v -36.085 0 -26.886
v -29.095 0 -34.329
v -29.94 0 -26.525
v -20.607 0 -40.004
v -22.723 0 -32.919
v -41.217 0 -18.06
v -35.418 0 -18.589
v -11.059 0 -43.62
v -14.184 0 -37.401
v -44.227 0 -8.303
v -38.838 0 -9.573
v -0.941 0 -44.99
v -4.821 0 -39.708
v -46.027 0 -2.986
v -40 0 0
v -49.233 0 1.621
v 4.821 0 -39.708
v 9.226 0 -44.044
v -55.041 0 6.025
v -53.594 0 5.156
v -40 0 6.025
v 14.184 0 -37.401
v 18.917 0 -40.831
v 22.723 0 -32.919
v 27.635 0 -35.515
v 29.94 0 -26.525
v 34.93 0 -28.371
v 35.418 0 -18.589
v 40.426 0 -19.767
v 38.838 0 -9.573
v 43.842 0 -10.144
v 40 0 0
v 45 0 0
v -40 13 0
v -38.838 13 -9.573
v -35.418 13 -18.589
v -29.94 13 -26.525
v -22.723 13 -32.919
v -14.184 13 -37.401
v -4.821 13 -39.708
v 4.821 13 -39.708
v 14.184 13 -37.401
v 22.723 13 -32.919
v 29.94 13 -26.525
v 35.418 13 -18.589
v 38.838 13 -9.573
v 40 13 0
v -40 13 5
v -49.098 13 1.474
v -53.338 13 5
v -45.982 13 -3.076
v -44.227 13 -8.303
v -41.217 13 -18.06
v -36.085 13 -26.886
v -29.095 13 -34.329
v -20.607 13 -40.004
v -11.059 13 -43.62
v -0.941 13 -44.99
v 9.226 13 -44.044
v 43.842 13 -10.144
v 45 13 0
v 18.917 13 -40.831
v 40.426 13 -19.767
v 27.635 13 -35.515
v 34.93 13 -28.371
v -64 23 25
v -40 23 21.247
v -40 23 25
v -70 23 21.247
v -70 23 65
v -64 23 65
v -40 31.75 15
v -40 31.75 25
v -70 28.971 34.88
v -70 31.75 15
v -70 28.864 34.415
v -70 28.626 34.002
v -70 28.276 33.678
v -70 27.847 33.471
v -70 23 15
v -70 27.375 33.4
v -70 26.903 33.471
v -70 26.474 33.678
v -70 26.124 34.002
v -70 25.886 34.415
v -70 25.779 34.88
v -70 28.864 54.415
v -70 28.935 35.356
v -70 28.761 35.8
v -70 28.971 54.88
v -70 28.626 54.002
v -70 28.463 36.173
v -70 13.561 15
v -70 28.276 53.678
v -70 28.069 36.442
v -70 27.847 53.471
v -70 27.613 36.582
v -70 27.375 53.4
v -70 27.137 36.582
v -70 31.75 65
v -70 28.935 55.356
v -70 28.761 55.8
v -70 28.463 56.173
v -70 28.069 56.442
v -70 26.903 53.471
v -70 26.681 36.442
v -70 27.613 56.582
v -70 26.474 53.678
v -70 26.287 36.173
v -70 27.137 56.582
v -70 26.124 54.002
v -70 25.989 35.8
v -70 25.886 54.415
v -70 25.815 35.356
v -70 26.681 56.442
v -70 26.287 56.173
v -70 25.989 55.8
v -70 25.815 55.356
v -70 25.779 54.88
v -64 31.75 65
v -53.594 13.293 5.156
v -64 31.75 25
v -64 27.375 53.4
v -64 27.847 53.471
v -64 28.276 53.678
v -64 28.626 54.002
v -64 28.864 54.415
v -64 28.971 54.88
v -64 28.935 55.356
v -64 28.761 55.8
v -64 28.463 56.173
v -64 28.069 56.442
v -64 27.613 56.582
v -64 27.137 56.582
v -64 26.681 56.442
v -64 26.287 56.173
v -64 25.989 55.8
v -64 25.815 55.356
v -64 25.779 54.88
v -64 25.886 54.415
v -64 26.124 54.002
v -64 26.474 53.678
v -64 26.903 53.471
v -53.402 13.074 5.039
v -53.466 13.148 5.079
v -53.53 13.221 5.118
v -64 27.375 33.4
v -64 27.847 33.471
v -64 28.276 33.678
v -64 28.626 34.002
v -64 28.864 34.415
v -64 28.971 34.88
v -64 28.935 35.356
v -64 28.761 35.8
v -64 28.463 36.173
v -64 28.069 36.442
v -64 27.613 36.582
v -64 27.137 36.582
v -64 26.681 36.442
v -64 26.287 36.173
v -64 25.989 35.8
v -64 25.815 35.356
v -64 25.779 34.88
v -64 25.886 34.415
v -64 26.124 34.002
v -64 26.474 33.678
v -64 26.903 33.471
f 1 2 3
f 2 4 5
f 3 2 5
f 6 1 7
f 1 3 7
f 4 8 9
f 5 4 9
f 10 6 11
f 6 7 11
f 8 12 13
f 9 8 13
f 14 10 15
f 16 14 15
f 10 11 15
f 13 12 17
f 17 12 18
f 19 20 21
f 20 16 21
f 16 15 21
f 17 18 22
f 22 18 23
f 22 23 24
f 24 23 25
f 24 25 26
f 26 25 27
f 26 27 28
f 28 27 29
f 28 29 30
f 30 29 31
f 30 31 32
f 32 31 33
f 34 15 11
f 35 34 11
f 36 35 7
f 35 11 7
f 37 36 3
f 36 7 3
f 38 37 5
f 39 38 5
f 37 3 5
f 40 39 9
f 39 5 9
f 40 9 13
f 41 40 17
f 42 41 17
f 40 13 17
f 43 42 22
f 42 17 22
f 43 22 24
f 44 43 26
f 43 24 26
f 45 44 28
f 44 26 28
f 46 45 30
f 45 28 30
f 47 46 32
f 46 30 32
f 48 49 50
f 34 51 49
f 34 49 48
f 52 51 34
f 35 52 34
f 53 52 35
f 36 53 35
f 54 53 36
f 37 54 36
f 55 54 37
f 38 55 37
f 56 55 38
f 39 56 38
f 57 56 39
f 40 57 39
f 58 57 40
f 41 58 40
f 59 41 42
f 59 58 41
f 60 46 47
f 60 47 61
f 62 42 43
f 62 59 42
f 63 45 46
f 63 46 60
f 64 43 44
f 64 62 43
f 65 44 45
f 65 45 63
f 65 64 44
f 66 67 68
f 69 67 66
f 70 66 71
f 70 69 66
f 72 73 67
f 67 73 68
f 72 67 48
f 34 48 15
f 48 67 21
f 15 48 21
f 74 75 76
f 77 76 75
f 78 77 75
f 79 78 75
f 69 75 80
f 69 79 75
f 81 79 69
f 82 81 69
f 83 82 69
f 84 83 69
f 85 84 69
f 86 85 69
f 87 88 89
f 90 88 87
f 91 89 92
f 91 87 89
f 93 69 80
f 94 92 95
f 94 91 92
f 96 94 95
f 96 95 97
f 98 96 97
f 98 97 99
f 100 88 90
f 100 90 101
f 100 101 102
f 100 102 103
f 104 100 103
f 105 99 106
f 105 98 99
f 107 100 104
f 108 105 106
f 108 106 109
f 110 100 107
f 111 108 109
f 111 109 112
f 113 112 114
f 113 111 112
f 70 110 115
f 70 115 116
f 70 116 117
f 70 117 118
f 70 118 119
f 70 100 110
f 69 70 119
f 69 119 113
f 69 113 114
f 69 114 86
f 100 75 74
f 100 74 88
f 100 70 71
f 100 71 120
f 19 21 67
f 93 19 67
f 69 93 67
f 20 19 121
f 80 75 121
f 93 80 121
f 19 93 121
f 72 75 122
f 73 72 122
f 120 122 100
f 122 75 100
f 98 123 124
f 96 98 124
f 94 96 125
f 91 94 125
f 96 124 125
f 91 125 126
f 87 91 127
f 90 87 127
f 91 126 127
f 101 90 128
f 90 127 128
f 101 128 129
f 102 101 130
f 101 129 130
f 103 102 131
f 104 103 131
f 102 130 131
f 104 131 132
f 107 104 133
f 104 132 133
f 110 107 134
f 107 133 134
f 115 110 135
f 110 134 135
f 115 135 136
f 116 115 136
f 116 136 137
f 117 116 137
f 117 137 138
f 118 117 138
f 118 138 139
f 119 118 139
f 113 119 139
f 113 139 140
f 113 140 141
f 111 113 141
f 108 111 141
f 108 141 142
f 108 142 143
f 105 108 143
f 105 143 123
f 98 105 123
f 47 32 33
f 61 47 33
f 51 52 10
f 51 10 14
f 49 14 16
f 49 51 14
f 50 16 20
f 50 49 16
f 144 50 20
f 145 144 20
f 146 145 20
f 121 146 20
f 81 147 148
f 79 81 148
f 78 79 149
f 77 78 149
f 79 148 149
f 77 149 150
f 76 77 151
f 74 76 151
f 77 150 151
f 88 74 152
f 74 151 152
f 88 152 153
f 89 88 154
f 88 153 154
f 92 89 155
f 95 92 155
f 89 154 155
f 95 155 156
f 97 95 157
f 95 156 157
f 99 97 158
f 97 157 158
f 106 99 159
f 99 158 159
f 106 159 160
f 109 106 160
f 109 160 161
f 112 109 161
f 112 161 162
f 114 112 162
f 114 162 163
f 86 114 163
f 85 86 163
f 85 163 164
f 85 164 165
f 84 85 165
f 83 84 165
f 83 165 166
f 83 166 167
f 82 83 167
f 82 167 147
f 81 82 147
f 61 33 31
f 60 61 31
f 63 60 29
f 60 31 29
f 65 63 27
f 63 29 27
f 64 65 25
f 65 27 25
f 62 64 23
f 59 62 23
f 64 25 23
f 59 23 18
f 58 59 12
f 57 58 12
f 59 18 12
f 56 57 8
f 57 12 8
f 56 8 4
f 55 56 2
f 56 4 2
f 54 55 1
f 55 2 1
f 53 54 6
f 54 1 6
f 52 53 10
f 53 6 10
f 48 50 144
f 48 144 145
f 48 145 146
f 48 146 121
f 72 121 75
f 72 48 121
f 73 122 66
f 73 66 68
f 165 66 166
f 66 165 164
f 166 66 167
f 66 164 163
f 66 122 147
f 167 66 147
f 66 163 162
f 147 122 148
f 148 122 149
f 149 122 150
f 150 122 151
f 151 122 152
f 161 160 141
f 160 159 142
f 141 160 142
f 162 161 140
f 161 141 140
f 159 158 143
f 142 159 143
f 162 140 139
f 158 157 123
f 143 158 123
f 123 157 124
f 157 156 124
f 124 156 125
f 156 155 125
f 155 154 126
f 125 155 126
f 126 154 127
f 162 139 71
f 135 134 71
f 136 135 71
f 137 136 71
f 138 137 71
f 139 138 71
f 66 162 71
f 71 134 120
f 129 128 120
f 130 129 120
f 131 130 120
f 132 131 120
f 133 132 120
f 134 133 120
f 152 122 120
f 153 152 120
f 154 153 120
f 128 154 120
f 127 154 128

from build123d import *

# Parameters (mm, degrees)
EXTRUDE_1_DEPTH          = 13
SKETCH_2_W               = 30
SKETCH_2_H               = 13
EXTRUDE_2_DEPTH          = 5
EXTRUDE_3_DEPTH          = 30
SKETCH_4_W               = 30
SKETCH_4_H               = 8.75
EXTRUDE_4_DEPTH          = 10
CUT_EXTRUDE_3_DEPTH      = 86.302769592
CUT_EXTRUDE_3_DEPTH_BACK = 86.302769592
SKETCH_9_W               = 40
SKETCH_9_H               = 8.75
EXTRUDE_5_DEPTH          = 6
SKETCH_10_R              = 1.6
CUT_EXTRUDE_4_DEPTH      = 131.820726569
PATTERN_LINEAR_1_COUNT   = 2
PATTERN_LINEAR_1_PITCH   = 20
CHAMFER_3_SIZE           = 30
CHAMFER_3_SIZE_2         = 6.247089083
FILLET_1_R               = 20


with BuildPart() as part:
    # 草圖1 → 填料-伸長1 (new body)
    with BuildSketch(Plane(origin=(0, 0, 0), x_dir=(1, 0, 0), z_dir=(0, 1, 0))):
        with BuildLine():
            Line((-45, 0), (-40, 0))
            ThreePointArc((-40, 0), (0, 40), (40, 0))
            Line((40, 0), (45, 0))
            ThreePointArc((45, 0), (0, 45), (-45, 0))
        make_face()
    extrude(amount=EXTRUDE_1_DEPTH)

    # 草圖2 → 填料-伸長2 (add)
    with BuildSketch(Plane.XY):
        with Locations((-55, 6.5)):
            Rectangle(SKETCH_2_W, SKETCH_2_H)
    extrude(amount=EXTRUDE_2_DEPTH)

    # 草圖3 → 填料-伸長3 (add)
    with BuildSketch(Plane(origin=(-40, 0, 0), x_dir=(0, 0, -1), z_dir=(1, 0, 0))):
        Polygon((-5, 0), (-5, 13), (-15, 31.75), (-15, 23), align=None)
    extrude(amount=-EXTRUDE_3_DEPTH)

    # 草圖4 → 填料-伸長4 (add)
    with BuildSketch(Plane.XY.offset(15)):
        with Locations((-55, 27.375)):
            Rectangle(SKETCH_4_W, SKETCH_4_H)
    extrude(amount=EXTRUDE_4_DEPTH)

    # 草圖8 → 除料-伸長3 (cut, two sides: drawn at the far end of the back side and taken through both)
    with BuildSketch(Plane(origin=(0, 13, 0), x_dir=(1, 0, 0), z_dir=(0, 1, 0)).offset(-CUT_EXTRUDE_3_DEPTH_BACK)):
        Polygon((-45, 0), (-70, -15), (-70, 0), align=None)
    extrude(amount=CUT_EXTRUDE_3_DEPTH + CUT_EXTRUDE_3_DEPTH_BACK, mode=Mode.SUBTRACT)

    # 草圖9 → 填料-伸長5 (add)
    with BuildSketch(Plane.ZY.offset(70)):
        with Locations((45, 27.375)):
            Rectangle(SKETCH_9_W, SKETCH_9_H)
    extrude(amount=-EXTRUDE_5_DEPTH)

    # 草圖10 → 除料-伸長4 (cut, through all)
    with BuildSketch(Plane(origin=(-64, 0, 0), x_dir=(0, 0, -1), z_dir=(1, 0, 0))):
        with Locations((-35, 27.375)):
            Circle(SKETCH_10_R)
    cut_extrude_4 = extrude(amount=-CUT_EXTRUDE_4_DEPTH, mode=Mode.SUBTRACT)

    # 直線複製排列1: 除料-伸長4 ×2
    with Locations(*[(0, 0, i * PATTERN_LINEAR_1_PITCH) for i in range(1, PATTERN_LINEAR_1_COUNT)]):
        add(cut_extrude_4, mode=Mode.SUBTRACT)

    # 導角3
    # the kernel refuses this chamfer: 30, 6.247089083 mm, written as the material it adds along each edge
    with BuildSketch(Plane(origin=(-40, 23, 15), x_dir=(0, -0.9143850797176141, -0.4048455581944953), z_dir=(-1, 0, 0))) as chamfer_3_piece_1_section:
        Polygon((CHAMFER_3_SIZE * 0.999977671636, CHAMFER_3_SIZE * 0.0066825316561), (-CHAMFER_3_SIZE_2 * 0.404845558197, CHAMFER_3_SIZE_2 * 0.914385079723), (0, 0), align=None)
    chamfer_3_piece_1 = extrude(amount=30, mode=Mode.PRIVATE)
    chamfer_3_piece_1 = split(chamfer_3_piece_1, bisect_by=Plane(origin=(-53.38759528, 0, 13.91258777), z_dir=(0, 1, 0)), keep=Keep.TOP, mode=Mode.PRIVATE)
    chamfer_3_piece_1 = split(chamfer_3_piece_1, bisect_by=Plane(origin=(-57.305255839, 15.236001875, 7.383153504), z_dir=(0.5144957554275266, 0, 0.8574929257125442)), keep=Keep.TOP, mode=Mode.PRIVATE)
    add(chamfer_3_piece_1)

    # 圓角1
    fillet_1_edges = [part.edges().sort_by_distance(p)[0] for p in [
        (-45, 6.5, 0),
    ]]
    fillet(fillet_1_edges, radius=FILLET_1_R)


solid = part.part
